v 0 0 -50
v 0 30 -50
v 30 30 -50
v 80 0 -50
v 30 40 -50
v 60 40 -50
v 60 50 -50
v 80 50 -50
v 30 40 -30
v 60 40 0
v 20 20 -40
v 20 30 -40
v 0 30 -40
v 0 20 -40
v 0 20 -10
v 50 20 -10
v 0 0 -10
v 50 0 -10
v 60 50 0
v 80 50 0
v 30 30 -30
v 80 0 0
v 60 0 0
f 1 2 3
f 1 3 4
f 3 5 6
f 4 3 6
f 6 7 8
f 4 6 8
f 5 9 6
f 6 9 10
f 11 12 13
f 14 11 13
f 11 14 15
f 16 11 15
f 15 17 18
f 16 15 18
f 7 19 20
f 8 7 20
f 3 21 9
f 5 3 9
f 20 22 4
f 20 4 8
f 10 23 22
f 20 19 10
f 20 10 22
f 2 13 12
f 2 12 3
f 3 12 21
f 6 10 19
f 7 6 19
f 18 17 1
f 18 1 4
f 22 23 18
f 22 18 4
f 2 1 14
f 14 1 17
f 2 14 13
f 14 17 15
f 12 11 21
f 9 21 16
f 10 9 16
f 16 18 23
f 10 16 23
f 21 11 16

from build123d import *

# Parameters (mm, degrees)
SKETCH1_W           = 80
SKETCH1_H           = 50
BOSS_EXTRUDE2_DEPTH = 50
SKETCH2_W           = 60
SKETCH2_H           = 10
CUT_EXTRUDE1_DEPTH  = 50
SKETCH3_W           = 30
SKETCH3_H           = 10
CUT_EXTRUDE2_DEPTH  = 50
CUT_EXTRUDE3_DEPTH  = 50
CUT_EXTRUDE4_DEPTH  = 20
CUT_EXTRUDE5_DEPTH  = 10


with BuildPart() as part:
    # Sketch1 → Boss-Extrude2 (new body)
    with BuildSketch(Plane.XY):
        with Locations((40, 25)):
            Rectangle(SKETCH1_W, SKETCH1_H)
    extrude(amount=-BOSS_EXTRUDE2_DEPTH)

    # Sketch2 → Cut-Extrude1 (cut)
    with BuildSketch(Plane.XY):
        with Locations((30, 45)):
            Rectangle(SKETCH2_W, SKETCH2_H)
    extrude(amount=-CUT_EXTRUDE1_DEPTH, mode=Mode.SUBTRACT)

    # Sketch3 → Cut-Extrude2 (cut)
    with BuildSketch(Plane.XY):
        with Locations((15, 35)):
            Rectangle(SKETCH3_W, SKETCH3_H)
    extrude(amount=-CUT_EXTRUDE2_DEPTH, mode=Mode.SUBTRACT)

    # Sketch4 → Cut-Extrude3 (cut)
    with BuildSketch(Plane.XZ):
        Polygon((60, 0), (0, 0), (0, -10), (50, -10), align=None)
    extrude(amount=-CUT_EXTRUDE3_DEPTH, mode=Mode.SUBTRACT)

    # Sketch5 → Cut-Extrude4 (cut)
    with BuildSketch(Plane(origin=(0, 40, 0), x_dir=(1, 0, 0), z_dir=(0, 1, 0))):
        Polygon((50, 10), (30, 30), (30, 10), align=None)
    extrude(amount=-CUT_EXTRUDE4_DEPTH, mode=Mode.SUBTRACT)

    # Sketch6 → Cut-Extrude5 (cut)
    with BuildSketch(Plane(origin=(0, 30, 0), x_dir=(1, 0, 0), z_dir=(0, 1, 0))):
        Polygon((0, 10), (50, 10), (20, 40), (0, 40), align=None)
    extrude(amount=-CUT_EXTRUDE5_DEPTH, mode=Mode.SUBTRACT)


solid = part.part
